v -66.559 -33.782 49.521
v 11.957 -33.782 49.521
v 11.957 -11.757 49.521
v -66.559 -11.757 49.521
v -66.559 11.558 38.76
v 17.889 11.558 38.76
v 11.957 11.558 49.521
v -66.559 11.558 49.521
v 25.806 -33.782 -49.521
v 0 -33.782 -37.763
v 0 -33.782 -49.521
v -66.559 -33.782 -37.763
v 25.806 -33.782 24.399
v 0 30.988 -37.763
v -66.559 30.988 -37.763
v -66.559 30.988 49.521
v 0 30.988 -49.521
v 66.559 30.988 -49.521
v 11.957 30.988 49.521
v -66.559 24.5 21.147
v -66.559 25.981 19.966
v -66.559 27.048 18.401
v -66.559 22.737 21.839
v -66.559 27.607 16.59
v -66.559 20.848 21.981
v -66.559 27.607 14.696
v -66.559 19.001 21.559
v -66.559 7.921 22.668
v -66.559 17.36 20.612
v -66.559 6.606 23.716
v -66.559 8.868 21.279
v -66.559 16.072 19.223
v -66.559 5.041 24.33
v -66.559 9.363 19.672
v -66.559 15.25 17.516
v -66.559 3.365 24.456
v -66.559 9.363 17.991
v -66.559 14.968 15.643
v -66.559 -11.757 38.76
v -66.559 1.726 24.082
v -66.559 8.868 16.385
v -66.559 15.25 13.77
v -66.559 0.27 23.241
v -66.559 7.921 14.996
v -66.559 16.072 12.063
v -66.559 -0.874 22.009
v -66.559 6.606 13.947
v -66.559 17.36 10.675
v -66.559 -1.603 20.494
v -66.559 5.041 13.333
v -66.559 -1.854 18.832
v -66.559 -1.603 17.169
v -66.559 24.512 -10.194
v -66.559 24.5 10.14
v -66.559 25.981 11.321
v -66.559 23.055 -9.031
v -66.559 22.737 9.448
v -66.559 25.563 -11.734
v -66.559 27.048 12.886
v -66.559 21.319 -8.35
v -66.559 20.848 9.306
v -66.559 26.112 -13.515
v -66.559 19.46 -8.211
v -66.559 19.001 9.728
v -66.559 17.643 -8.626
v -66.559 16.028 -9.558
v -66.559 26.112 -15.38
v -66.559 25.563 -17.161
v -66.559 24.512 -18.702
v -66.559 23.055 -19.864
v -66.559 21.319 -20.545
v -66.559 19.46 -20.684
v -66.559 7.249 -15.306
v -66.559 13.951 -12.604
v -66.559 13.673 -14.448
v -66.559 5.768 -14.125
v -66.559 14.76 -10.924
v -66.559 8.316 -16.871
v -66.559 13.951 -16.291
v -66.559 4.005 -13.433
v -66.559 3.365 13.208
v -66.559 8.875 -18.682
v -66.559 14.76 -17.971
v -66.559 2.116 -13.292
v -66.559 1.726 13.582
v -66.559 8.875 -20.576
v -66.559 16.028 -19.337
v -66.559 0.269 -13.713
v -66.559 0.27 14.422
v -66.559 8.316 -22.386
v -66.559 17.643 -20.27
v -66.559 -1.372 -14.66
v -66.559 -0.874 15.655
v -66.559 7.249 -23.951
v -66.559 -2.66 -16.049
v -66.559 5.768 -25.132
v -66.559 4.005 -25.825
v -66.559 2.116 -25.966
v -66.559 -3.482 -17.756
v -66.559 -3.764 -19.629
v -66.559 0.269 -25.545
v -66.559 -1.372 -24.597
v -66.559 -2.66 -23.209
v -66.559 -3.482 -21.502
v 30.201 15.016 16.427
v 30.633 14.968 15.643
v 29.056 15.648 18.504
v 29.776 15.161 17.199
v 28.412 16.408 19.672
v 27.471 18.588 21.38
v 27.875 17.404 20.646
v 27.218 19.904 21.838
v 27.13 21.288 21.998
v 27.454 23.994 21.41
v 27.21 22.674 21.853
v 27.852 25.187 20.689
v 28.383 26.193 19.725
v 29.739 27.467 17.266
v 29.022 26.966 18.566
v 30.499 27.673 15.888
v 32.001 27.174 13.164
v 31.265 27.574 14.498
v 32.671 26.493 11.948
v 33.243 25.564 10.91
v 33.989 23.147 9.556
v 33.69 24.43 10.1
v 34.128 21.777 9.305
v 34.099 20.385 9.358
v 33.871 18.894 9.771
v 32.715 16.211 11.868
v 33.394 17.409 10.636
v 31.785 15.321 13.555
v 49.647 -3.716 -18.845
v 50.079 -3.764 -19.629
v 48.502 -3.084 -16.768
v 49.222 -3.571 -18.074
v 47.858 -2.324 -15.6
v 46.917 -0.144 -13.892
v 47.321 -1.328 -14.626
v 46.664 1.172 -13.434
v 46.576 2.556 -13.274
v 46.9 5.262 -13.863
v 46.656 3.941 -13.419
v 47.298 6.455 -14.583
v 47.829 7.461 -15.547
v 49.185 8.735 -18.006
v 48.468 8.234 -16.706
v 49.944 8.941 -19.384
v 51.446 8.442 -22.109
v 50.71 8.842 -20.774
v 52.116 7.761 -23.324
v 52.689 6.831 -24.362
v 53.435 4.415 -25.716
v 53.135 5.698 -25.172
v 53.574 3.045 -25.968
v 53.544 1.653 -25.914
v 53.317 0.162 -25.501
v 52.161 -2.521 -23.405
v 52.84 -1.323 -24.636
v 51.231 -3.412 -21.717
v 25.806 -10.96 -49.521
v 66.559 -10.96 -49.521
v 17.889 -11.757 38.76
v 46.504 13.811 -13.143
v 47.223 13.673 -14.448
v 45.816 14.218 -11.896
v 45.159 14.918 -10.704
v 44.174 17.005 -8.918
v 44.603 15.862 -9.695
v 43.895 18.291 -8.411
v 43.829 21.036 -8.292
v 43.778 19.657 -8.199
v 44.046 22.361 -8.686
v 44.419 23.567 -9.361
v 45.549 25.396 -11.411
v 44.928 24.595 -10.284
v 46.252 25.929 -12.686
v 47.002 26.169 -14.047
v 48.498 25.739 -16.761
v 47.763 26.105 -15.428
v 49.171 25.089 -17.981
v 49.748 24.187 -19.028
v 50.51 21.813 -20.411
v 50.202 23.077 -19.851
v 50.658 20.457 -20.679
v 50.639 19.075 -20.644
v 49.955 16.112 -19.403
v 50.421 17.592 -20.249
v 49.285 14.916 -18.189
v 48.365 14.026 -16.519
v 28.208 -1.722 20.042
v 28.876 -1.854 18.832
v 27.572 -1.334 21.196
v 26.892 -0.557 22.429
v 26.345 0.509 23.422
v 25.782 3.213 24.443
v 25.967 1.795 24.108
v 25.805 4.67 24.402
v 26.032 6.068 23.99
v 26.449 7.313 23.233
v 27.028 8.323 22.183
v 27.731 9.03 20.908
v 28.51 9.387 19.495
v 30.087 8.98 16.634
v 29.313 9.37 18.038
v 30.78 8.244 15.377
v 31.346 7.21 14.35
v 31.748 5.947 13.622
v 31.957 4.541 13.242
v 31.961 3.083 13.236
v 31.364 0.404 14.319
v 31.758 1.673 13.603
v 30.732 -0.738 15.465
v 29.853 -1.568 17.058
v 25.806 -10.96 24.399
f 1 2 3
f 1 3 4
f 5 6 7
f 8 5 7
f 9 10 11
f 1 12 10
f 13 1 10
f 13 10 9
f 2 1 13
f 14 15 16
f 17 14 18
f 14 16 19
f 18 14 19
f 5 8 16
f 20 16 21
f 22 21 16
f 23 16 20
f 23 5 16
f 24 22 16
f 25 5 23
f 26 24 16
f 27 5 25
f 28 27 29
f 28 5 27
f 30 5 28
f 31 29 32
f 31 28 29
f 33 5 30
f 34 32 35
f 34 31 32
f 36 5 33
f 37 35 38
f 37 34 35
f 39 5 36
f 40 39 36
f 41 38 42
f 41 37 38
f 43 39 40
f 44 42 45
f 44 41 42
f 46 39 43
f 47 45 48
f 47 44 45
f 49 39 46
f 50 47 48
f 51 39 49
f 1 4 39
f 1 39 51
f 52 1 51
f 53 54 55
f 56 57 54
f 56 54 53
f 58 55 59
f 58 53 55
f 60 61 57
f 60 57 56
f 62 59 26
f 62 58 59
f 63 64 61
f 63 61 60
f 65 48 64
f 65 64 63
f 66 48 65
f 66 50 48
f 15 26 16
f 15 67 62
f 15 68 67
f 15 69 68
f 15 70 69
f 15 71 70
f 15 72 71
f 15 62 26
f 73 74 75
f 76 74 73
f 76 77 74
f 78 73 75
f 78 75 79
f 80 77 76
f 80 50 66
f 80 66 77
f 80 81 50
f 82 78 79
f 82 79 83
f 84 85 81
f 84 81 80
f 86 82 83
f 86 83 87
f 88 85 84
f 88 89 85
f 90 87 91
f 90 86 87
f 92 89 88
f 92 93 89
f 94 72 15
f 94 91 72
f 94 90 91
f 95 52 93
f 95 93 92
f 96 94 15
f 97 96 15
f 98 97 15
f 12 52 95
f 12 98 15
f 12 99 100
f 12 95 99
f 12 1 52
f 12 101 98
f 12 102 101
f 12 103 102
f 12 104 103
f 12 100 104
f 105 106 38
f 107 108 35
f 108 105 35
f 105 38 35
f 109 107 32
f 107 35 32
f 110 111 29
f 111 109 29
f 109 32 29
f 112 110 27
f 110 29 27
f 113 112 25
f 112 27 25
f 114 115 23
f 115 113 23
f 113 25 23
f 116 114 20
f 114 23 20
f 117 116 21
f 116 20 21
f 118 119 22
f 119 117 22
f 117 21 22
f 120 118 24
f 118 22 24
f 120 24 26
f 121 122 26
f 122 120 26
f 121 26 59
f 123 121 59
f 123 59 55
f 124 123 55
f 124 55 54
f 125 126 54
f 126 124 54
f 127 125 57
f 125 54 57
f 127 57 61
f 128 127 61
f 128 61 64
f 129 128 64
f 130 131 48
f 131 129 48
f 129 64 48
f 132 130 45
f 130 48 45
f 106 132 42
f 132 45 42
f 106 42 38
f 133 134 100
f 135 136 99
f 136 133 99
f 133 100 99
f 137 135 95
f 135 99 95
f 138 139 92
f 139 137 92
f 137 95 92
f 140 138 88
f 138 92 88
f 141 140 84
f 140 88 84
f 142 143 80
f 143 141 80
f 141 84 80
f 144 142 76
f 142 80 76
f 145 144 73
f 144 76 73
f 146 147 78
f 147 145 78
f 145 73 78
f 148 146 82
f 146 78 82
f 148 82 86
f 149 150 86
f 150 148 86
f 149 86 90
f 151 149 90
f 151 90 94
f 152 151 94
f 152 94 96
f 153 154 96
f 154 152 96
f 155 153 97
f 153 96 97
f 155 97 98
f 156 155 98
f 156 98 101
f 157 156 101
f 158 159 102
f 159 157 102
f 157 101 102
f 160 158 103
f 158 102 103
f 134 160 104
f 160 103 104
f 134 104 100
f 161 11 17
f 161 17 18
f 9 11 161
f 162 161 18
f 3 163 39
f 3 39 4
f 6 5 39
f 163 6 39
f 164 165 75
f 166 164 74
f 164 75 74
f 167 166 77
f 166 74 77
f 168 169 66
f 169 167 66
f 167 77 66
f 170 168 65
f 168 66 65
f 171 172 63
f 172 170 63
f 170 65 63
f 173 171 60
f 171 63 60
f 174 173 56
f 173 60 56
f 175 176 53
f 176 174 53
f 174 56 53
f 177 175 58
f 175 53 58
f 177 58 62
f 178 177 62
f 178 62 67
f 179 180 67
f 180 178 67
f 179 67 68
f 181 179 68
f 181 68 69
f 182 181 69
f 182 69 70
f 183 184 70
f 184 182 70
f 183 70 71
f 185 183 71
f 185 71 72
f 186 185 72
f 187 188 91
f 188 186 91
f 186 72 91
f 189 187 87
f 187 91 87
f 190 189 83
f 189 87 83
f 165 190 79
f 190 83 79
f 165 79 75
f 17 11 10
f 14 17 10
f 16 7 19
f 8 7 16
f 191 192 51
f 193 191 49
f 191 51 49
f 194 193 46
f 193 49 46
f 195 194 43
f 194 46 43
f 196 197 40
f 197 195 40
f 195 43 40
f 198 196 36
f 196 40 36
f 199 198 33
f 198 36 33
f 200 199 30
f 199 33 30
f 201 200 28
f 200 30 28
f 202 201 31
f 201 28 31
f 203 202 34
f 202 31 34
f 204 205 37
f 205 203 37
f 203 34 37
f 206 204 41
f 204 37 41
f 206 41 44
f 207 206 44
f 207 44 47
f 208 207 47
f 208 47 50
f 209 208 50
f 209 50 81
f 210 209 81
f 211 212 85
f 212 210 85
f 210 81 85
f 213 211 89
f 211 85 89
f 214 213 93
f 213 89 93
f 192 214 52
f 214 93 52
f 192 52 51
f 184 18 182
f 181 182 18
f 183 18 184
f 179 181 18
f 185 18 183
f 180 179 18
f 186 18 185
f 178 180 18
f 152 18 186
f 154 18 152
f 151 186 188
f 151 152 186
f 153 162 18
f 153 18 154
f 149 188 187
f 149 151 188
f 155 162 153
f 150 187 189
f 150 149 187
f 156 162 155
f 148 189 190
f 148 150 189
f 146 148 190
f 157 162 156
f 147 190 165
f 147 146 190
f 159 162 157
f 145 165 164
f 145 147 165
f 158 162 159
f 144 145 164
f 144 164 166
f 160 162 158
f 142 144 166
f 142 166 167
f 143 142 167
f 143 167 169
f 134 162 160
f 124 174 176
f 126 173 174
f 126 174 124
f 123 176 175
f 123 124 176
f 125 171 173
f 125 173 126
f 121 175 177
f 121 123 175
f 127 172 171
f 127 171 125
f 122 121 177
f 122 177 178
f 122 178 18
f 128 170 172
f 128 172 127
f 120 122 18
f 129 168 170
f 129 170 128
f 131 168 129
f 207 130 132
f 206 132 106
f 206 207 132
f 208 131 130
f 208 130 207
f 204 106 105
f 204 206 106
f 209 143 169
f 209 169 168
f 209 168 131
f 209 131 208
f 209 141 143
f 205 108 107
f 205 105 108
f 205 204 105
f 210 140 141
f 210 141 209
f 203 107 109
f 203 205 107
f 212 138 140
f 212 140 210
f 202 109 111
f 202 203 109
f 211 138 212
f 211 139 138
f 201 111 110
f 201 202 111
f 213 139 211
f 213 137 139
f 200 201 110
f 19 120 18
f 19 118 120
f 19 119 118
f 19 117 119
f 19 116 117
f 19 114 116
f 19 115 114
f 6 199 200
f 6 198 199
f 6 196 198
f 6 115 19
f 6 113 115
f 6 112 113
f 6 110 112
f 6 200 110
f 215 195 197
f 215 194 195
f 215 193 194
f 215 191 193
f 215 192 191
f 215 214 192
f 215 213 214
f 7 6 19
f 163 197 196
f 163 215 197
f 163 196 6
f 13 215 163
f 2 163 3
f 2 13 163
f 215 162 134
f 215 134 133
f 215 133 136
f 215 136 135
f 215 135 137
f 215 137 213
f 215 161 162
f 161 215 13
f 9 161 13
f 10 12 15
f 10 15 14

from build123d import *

# Parameters (mm, degrees)
F1_DEPTH      = 33.782
F1_DEPTH_BACK = 30.988
F2_W          = 23.3154920861
F2_H          = 10.7609964907
F3_DEPTH      = 133.35
F4_W          = 40.752293542
F4_H          = 22.821725624
F5_DEPTH      = 113.792
F6_R          = 6.3550530627
F6_R_2        = 5.6399455055
F6_R_3        = 6.2542744147
F6_R_4        = 6.3550538293
F7_DEPTH      = 204.978
F8_W          = 66.5587559342
F8_H          = 11.7573849857
F9_DEPTH      = 176.53


with BuildPart() as f1:
    # F0 (on Front) → F1 (new body, two sides)
    with BuildSketch(Plane.XZ) as f1_sk:
        Polygon((66.5587559342, -49.5205111802), (11.9566628709, 49.5205111802), (-66.5587559342, 49.5205111802), (-66.5587559342, -49.5205111802), align=None)
    extrude(amount=F1_DEPTH)
    extrude(f1_sk.sketch, amount=-F1_DEPTH_BACK)

    # F2 (on face) → F3 (cut)
    with BuildSketch(Plane(origin=(-66.5587559342, 0, 0), x_dir=(0, -1, 0), z_dir=(-1, 0, 0))):
        with Locations((0.0996389426, 44.1400129348)):
            Rectangle(F2_W, F2_H)
    extrude(amount=-F3_DEPTH, mode=Mode.SUBTRACT)

    # F4 (on face) → F5 (cut)
    with BuildSketch(Plane(origin=(0, 0, -49.5205111802), x_dir=(1, 0, 0), z_dir=(0, 0, -1))):
        with Locations((46.1826091632, 22.371137188)):
            Rectangle(F4_W, F4_H)
    extrude(amount=-F5_DEPTH, mode=Mode.SUBTRACT)

    # F6 (on face) → F7 (cut)
    with BuildSketch(Plane(origin=(-66.5587559342, 0, 0), x_dir=(0, -1, 0), z_dir=(-1, 0, 0))):
        with Locations((-21.3227141649, 15.6433004886)):
            Circle(F6_R)
        with Locations((-3.7862760946, 18.8317429274)):
            Circle(F6_R_2)
        with Locations((-19.927771762, -14.4476341084)):
            Circle(F6_R_3)
        with Locations((-2.5906104129, -19.6288544685)):
            Circle(F6_R_4)
    extrude(amount=-F7_DEPTH, mode=Mode.SUBTRACT)

    # F8 (on face) → F9 (cut)
    with BuildSketch(Plane.XZ.offset(33.782)):
        with Locations((-33.2793779671, -43.6418186873)):
            Rectangle(F8_W, F8_H)
    extrude(amount=-F9_DEPTH, mode=Mode.SUBTRACT)


solid = f1.part
